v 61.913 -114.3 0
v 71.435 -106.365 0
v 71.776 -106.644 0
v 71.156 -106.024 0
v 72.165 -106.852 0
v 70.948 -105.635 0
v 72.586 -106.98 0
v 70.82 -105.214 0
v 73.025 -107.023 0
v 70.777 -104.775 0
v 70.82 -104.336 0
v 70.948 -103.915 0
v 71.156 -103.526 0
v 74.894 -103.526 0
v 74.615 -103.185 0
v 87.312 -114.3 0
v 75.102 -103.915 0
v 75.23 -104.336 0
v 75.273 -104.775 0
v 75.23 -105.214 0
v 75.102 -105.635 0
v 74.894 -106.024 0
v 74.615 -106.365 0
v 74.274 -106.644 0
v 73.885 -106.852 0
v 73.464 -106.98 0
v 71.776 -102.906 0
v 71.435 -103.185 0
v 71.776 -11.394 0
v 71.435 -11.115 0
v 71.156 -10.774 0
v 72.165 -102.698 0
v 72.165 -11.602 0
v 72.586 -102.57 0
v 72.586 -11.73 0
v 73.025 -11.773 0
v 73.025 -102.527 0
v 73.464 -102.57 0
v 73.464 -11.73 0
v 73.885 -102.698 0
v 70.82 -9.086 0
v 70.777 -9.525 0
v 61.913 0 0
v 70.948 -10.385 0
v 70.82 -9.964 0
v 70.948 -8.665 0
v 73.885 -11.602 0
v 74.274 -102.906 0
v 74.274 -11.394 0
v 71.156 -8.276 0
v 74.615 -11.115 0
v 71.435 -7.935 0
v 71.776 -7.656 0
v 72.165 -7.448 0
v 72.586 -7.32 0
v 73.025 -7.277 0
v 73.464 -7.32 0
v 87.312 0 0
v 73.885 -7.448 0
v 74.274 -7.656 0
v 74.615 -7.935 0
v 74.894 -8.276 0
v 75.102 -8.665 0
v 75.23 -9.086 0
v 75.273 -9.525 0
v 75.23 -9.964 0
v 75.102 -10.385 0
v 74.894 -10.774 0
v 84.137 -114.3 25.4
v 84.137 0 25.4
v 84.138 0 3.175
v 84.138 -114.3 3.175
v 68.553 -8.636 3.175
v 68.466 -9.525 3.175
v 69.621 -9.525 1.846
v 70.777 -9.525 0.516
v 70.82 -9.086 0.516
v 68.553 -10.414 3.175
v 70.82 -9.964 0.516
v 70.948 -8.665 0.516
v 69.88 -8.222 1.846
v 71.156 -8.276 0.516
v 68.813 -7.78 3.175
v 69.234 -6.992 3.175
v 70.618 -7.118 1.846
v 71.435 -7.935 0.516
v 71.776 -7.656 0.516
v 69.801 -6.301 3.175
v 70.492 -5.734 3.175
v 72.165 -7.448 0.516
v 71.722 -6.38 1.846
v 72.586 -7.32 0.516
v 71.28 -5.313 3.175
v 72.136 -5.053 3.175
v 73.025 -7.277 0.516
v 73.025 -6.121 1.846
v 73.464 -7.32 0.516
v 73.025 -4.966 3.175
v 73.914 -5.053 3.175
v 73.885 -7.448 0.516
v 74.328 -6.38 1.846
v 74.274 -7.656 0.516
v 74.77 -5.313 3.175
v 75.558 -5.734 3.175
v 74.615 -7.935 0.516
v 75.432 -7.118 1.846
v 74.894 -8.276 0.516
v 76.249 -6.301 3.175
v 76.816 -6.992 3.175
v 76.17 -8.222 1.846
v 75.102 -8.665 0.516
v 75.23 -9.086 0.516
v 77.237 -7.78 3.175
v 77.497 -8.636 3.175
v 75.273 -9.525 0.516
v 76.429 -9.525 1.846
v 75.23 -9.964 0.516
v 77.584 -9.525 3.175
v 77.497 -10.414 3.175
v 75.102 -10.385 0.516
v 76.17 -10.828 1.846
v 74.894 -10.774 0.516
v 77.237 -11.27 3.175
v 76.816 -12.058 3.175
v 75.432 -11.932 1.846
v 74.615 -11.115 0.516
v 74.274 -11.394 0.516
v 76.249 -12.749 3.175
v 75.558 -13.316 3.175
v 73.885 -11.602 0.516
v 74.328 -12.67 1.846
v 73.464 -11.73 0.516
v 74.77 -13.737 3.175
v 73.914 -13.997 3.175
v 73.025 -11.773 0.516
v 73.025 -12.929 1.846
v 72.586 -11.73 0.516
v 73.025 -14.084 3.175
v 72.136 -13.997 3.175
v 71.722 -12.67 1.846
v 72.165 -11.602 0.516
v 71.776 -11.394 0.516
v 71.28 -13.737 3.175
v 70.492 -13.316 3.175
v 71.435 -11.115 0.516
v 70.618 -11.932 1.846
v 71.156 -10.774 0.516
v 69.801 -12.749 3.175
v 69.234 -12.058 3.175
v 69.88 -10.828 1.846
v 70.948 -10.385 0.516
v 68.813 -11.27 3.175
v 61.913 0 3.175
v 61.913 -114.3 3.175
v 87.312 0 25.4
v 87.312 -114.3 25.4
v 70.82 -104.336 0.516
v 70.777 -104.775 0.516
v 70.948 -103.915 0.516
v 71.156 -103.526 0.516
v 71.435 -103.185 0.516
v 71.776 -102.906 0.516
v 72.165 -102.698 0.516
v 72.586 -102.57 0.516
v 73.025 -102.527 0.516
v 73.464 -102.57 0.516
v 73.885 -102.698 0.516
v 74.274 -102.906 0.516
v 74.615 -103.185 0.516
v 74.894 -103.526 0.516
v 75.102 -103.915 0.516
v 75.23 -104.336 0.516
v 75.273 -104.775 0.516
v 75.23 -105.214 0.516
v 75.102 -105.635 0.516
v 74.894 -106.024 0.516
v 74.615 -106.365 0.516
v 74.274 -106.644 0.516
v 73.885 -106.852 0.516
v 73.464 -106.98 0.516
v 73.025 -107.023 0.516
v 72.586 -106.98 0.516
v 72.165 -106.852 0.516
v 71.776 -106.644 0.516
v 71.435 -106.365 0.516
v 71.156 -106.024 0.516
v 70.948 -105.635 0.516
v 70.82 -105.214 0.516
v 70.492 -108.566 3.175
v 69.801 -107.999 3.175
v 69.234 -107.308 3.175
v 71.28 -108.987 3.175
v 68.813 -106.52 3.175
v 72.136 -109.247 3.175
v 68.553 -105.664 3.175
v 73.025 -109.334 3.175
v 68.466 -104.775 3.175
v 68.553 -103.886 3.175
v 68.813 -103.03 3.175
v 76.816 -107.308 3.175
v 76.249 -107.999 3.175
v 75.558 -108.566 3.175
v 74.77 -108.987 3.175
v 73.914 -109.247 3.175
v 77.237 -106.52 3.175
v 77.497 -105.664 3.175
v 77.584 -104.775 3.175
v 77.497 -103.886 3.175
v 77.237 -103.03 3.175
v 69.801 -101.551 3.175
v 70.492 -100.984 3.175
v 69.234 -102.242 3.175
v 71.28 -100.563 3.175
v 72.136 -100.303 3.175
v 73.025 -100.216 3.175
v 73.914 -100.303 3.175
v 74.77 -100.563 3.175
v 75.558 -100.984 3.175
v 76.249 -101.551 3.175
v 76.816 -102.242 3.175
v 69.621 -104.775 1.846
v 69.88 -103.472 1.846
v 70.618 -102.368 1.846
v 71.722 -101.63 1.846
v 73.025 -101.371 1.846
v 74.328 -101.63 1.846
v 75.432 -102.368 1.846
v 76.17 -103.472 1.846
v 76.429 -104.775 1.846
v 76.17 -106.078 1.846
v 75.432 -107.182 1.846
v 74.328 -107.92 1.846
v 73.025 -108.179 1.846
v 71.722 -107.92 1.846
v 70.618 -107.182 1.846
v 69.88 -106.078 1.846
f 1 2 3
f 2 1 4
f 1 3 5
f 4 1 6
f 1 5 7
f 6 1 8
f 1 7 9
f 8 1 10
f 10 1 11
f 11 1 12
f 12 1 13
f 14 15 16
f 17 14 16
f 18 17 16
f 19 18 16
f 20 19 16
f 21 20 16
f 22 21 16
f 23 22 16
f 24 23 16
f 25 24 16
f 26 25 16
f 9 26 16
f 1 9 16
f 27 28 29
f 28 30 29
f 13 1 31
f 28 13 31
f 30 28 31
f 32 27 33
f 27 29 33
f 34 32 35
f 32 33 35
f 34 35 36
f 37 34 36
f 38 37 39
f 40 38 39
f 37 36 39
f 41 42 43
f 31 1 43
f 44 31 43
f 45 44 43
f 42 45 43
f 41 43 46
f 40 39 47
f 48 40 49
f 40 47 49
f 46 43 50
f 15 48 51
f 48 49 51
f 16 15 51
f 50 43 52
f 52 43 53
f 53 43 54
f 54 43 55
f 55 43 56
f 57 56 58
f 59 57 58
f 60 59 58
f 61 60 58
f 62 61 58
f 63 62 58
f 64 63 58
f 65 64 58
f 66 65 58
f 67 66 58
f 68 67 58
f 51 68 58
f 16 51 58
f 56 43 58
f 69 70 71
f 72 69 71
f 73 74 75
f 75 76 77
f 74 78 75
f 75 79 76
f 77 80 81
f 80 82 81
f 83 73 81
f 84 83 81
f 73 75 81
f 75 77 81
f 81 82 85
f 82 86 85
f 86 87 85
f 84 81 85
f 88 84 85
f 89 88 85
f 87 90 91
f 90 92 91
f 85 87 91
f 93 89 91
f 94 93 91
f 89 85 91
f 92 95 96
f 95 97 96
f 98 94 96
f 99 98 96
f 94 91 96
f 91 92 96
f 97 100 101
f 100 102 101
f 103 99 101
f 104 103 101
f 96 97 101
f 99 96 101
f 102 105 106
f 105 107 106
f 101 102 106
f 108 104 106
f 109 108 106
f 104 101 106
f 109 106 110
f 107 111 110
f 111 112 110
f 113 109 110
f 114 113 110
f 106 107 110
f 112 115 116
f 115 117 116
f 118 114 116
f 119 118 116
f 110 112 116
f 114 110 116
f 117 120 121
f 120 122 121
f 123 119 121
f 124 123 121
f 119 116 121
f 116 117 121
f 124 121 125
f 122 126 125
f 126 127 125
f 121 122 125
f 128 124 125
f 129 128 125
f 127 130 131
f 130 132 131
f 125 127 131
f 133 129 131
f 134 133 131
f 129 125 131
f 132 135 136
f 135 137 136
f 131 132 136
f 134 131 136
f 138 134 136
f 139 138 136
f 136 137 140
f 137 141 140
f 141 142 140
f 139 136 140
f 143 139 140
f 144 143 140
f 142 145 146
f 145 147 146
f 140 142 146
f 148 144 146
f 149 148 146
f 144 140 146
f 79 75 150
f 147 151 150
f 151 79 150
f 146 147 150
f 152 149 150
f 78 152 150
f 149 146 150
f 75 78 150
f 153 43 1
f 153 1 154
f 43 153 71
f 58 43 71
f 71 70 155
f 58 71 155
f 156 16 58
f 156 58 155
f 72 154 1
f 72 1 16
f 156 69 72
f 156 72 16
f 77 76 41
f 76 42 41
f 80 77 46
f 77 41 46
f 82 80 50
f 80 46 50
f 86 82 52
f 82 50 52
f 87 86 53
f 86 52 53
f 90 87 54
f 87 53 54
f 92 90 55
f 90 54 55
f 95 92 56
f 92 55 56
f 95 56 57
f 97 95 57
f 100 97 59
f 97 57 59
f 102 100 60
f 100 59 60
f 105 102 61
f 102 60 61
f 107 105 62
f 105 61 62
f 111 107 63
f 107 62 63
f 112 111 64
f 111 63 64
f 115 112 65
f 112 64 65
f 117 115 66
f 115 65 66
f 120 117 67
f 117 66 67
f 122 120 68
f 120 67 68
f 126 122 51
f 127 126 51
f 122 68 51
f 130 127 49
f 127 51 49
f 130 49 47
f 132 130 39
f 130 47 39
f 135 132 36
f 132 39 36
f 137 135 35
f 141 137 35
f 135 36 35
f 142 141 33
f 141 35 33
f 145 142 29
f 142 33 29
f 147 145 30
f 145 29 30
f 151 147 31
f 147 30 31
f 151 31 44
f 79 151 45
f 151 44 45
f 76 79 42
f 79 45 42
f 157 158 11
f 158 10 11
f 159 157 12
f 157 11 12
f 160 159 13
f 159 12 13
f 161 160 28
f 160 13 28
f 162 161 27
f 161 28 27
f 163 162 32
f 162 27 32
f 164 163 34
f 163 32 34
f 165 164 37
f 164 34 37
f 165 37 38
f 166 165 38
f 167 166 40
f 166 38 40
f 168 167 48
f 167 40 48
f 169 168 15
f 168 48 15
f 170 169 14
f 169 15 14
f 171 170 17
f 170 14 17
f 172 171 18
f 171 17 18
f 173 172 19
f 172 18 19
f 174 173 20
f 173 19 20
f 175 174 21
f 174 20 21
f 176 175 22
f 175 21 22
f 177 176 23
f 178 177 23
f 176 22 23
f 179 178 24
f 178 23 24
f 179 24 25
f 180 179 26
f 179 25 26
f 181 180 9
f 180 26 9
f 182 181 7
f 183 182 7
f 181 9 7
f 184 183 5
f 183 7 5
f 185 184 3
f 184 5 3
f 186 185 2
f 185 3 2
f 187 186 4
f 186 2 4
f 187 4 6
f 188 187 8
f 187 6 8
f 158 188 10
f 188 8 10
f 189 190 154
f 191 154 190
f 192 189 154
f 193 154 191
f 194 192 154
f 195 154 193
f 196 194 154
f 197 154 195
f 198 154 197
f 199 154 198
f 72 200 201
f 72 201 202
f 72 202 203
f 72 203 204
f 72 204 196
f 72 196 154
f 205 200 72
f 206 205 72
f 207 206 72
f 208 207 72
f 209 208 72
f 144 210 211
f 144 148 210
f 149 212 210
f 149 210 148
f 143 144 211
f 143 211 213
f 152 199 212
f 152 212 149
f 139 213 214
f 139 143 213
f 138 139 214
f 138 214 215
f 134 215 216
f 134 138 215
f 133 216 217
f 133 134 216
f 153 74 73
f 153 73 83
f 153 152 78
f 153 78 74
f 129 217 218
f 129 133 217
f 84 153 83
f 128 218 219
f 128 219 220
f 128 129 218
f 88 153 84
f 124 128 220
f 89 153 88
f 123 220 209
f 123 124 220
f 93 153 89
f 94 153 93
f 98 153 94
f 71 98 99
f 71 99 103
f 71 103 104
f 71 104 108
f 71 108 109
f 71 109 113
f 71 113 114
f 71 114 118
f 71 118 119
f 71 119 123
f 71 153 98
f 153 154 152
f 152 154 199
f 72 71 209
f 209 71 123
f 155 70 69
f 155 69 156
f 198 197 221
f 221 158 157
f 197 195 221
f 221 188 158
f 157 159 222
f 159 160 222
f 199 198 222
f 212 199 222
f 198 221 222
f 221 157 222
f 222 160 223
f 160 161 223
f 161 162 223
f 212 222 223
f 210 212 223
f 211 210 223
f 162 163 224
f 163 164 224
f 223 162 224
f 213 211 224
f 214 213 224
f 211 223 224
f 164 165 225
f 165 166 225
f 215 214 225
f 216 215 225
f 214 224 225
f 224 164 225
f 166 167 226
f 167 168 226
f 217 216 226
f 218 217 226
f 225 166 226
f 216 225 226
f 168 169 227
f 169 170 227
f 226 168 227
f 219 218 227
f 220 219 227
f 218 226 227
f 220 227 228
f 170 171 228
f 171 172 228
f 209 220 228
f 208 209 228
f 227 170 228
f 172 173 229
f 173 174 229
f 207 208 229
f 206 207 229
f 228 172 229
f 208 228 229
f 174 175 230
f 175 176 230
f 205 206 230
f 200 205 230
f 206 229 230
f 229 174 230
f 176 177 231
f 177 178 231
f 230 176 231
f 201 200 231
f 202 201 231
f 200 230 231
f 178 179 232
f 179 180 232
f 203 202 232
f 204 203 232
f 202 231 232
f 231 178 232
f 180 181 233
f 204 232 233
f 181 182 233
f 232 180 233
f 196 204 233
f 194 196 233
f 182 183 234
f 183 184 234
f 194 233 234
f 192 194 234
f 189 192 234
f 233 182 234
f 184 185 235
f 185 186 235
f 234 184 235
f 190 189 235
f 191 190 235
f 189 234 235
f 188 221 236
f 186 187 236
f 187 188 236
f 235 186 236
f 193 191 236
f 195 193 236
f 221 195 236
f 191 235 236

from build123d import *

# Parameters (mm, degrees)
F0_W           = 3.175
F0_H           = 22.225
F0_H_2         = 3.175
F0_W_2         = 22.225
F1_DEPTH       = 114.3
F3_D           = 4.4958
F3_CSINK_D     = 9.1186
F3_CSINK_ANGLE = 82


with BuildPart() as f1:
    # F0 (on Front) → F1 (new body)
    with BuildSketch(Plane.XZ):
        with Locations((85.725, 14.2875)):
            Rectangle(F0_W, F0_H)
        with Locations((85.725, 1.5875)):
            Rectangle(F0_W, F0_H_2)
        with Locations((73.025, 1.5875)):
            Rectangle(F0_W_2, F0_H_2)
    extrude(amount=F1_DEPTH)

    # F3 (through all)
    with Locations(Plane.XY.offset(3.175)):
        with Locations((73.025, -104.775), (73.025, -9.525)):
            CounterSinkHole(F3_D / 2, F3_CSINK_D / 2, counter_sink_angle=F3_CSINK_ANGLE)


solid = f1.part
